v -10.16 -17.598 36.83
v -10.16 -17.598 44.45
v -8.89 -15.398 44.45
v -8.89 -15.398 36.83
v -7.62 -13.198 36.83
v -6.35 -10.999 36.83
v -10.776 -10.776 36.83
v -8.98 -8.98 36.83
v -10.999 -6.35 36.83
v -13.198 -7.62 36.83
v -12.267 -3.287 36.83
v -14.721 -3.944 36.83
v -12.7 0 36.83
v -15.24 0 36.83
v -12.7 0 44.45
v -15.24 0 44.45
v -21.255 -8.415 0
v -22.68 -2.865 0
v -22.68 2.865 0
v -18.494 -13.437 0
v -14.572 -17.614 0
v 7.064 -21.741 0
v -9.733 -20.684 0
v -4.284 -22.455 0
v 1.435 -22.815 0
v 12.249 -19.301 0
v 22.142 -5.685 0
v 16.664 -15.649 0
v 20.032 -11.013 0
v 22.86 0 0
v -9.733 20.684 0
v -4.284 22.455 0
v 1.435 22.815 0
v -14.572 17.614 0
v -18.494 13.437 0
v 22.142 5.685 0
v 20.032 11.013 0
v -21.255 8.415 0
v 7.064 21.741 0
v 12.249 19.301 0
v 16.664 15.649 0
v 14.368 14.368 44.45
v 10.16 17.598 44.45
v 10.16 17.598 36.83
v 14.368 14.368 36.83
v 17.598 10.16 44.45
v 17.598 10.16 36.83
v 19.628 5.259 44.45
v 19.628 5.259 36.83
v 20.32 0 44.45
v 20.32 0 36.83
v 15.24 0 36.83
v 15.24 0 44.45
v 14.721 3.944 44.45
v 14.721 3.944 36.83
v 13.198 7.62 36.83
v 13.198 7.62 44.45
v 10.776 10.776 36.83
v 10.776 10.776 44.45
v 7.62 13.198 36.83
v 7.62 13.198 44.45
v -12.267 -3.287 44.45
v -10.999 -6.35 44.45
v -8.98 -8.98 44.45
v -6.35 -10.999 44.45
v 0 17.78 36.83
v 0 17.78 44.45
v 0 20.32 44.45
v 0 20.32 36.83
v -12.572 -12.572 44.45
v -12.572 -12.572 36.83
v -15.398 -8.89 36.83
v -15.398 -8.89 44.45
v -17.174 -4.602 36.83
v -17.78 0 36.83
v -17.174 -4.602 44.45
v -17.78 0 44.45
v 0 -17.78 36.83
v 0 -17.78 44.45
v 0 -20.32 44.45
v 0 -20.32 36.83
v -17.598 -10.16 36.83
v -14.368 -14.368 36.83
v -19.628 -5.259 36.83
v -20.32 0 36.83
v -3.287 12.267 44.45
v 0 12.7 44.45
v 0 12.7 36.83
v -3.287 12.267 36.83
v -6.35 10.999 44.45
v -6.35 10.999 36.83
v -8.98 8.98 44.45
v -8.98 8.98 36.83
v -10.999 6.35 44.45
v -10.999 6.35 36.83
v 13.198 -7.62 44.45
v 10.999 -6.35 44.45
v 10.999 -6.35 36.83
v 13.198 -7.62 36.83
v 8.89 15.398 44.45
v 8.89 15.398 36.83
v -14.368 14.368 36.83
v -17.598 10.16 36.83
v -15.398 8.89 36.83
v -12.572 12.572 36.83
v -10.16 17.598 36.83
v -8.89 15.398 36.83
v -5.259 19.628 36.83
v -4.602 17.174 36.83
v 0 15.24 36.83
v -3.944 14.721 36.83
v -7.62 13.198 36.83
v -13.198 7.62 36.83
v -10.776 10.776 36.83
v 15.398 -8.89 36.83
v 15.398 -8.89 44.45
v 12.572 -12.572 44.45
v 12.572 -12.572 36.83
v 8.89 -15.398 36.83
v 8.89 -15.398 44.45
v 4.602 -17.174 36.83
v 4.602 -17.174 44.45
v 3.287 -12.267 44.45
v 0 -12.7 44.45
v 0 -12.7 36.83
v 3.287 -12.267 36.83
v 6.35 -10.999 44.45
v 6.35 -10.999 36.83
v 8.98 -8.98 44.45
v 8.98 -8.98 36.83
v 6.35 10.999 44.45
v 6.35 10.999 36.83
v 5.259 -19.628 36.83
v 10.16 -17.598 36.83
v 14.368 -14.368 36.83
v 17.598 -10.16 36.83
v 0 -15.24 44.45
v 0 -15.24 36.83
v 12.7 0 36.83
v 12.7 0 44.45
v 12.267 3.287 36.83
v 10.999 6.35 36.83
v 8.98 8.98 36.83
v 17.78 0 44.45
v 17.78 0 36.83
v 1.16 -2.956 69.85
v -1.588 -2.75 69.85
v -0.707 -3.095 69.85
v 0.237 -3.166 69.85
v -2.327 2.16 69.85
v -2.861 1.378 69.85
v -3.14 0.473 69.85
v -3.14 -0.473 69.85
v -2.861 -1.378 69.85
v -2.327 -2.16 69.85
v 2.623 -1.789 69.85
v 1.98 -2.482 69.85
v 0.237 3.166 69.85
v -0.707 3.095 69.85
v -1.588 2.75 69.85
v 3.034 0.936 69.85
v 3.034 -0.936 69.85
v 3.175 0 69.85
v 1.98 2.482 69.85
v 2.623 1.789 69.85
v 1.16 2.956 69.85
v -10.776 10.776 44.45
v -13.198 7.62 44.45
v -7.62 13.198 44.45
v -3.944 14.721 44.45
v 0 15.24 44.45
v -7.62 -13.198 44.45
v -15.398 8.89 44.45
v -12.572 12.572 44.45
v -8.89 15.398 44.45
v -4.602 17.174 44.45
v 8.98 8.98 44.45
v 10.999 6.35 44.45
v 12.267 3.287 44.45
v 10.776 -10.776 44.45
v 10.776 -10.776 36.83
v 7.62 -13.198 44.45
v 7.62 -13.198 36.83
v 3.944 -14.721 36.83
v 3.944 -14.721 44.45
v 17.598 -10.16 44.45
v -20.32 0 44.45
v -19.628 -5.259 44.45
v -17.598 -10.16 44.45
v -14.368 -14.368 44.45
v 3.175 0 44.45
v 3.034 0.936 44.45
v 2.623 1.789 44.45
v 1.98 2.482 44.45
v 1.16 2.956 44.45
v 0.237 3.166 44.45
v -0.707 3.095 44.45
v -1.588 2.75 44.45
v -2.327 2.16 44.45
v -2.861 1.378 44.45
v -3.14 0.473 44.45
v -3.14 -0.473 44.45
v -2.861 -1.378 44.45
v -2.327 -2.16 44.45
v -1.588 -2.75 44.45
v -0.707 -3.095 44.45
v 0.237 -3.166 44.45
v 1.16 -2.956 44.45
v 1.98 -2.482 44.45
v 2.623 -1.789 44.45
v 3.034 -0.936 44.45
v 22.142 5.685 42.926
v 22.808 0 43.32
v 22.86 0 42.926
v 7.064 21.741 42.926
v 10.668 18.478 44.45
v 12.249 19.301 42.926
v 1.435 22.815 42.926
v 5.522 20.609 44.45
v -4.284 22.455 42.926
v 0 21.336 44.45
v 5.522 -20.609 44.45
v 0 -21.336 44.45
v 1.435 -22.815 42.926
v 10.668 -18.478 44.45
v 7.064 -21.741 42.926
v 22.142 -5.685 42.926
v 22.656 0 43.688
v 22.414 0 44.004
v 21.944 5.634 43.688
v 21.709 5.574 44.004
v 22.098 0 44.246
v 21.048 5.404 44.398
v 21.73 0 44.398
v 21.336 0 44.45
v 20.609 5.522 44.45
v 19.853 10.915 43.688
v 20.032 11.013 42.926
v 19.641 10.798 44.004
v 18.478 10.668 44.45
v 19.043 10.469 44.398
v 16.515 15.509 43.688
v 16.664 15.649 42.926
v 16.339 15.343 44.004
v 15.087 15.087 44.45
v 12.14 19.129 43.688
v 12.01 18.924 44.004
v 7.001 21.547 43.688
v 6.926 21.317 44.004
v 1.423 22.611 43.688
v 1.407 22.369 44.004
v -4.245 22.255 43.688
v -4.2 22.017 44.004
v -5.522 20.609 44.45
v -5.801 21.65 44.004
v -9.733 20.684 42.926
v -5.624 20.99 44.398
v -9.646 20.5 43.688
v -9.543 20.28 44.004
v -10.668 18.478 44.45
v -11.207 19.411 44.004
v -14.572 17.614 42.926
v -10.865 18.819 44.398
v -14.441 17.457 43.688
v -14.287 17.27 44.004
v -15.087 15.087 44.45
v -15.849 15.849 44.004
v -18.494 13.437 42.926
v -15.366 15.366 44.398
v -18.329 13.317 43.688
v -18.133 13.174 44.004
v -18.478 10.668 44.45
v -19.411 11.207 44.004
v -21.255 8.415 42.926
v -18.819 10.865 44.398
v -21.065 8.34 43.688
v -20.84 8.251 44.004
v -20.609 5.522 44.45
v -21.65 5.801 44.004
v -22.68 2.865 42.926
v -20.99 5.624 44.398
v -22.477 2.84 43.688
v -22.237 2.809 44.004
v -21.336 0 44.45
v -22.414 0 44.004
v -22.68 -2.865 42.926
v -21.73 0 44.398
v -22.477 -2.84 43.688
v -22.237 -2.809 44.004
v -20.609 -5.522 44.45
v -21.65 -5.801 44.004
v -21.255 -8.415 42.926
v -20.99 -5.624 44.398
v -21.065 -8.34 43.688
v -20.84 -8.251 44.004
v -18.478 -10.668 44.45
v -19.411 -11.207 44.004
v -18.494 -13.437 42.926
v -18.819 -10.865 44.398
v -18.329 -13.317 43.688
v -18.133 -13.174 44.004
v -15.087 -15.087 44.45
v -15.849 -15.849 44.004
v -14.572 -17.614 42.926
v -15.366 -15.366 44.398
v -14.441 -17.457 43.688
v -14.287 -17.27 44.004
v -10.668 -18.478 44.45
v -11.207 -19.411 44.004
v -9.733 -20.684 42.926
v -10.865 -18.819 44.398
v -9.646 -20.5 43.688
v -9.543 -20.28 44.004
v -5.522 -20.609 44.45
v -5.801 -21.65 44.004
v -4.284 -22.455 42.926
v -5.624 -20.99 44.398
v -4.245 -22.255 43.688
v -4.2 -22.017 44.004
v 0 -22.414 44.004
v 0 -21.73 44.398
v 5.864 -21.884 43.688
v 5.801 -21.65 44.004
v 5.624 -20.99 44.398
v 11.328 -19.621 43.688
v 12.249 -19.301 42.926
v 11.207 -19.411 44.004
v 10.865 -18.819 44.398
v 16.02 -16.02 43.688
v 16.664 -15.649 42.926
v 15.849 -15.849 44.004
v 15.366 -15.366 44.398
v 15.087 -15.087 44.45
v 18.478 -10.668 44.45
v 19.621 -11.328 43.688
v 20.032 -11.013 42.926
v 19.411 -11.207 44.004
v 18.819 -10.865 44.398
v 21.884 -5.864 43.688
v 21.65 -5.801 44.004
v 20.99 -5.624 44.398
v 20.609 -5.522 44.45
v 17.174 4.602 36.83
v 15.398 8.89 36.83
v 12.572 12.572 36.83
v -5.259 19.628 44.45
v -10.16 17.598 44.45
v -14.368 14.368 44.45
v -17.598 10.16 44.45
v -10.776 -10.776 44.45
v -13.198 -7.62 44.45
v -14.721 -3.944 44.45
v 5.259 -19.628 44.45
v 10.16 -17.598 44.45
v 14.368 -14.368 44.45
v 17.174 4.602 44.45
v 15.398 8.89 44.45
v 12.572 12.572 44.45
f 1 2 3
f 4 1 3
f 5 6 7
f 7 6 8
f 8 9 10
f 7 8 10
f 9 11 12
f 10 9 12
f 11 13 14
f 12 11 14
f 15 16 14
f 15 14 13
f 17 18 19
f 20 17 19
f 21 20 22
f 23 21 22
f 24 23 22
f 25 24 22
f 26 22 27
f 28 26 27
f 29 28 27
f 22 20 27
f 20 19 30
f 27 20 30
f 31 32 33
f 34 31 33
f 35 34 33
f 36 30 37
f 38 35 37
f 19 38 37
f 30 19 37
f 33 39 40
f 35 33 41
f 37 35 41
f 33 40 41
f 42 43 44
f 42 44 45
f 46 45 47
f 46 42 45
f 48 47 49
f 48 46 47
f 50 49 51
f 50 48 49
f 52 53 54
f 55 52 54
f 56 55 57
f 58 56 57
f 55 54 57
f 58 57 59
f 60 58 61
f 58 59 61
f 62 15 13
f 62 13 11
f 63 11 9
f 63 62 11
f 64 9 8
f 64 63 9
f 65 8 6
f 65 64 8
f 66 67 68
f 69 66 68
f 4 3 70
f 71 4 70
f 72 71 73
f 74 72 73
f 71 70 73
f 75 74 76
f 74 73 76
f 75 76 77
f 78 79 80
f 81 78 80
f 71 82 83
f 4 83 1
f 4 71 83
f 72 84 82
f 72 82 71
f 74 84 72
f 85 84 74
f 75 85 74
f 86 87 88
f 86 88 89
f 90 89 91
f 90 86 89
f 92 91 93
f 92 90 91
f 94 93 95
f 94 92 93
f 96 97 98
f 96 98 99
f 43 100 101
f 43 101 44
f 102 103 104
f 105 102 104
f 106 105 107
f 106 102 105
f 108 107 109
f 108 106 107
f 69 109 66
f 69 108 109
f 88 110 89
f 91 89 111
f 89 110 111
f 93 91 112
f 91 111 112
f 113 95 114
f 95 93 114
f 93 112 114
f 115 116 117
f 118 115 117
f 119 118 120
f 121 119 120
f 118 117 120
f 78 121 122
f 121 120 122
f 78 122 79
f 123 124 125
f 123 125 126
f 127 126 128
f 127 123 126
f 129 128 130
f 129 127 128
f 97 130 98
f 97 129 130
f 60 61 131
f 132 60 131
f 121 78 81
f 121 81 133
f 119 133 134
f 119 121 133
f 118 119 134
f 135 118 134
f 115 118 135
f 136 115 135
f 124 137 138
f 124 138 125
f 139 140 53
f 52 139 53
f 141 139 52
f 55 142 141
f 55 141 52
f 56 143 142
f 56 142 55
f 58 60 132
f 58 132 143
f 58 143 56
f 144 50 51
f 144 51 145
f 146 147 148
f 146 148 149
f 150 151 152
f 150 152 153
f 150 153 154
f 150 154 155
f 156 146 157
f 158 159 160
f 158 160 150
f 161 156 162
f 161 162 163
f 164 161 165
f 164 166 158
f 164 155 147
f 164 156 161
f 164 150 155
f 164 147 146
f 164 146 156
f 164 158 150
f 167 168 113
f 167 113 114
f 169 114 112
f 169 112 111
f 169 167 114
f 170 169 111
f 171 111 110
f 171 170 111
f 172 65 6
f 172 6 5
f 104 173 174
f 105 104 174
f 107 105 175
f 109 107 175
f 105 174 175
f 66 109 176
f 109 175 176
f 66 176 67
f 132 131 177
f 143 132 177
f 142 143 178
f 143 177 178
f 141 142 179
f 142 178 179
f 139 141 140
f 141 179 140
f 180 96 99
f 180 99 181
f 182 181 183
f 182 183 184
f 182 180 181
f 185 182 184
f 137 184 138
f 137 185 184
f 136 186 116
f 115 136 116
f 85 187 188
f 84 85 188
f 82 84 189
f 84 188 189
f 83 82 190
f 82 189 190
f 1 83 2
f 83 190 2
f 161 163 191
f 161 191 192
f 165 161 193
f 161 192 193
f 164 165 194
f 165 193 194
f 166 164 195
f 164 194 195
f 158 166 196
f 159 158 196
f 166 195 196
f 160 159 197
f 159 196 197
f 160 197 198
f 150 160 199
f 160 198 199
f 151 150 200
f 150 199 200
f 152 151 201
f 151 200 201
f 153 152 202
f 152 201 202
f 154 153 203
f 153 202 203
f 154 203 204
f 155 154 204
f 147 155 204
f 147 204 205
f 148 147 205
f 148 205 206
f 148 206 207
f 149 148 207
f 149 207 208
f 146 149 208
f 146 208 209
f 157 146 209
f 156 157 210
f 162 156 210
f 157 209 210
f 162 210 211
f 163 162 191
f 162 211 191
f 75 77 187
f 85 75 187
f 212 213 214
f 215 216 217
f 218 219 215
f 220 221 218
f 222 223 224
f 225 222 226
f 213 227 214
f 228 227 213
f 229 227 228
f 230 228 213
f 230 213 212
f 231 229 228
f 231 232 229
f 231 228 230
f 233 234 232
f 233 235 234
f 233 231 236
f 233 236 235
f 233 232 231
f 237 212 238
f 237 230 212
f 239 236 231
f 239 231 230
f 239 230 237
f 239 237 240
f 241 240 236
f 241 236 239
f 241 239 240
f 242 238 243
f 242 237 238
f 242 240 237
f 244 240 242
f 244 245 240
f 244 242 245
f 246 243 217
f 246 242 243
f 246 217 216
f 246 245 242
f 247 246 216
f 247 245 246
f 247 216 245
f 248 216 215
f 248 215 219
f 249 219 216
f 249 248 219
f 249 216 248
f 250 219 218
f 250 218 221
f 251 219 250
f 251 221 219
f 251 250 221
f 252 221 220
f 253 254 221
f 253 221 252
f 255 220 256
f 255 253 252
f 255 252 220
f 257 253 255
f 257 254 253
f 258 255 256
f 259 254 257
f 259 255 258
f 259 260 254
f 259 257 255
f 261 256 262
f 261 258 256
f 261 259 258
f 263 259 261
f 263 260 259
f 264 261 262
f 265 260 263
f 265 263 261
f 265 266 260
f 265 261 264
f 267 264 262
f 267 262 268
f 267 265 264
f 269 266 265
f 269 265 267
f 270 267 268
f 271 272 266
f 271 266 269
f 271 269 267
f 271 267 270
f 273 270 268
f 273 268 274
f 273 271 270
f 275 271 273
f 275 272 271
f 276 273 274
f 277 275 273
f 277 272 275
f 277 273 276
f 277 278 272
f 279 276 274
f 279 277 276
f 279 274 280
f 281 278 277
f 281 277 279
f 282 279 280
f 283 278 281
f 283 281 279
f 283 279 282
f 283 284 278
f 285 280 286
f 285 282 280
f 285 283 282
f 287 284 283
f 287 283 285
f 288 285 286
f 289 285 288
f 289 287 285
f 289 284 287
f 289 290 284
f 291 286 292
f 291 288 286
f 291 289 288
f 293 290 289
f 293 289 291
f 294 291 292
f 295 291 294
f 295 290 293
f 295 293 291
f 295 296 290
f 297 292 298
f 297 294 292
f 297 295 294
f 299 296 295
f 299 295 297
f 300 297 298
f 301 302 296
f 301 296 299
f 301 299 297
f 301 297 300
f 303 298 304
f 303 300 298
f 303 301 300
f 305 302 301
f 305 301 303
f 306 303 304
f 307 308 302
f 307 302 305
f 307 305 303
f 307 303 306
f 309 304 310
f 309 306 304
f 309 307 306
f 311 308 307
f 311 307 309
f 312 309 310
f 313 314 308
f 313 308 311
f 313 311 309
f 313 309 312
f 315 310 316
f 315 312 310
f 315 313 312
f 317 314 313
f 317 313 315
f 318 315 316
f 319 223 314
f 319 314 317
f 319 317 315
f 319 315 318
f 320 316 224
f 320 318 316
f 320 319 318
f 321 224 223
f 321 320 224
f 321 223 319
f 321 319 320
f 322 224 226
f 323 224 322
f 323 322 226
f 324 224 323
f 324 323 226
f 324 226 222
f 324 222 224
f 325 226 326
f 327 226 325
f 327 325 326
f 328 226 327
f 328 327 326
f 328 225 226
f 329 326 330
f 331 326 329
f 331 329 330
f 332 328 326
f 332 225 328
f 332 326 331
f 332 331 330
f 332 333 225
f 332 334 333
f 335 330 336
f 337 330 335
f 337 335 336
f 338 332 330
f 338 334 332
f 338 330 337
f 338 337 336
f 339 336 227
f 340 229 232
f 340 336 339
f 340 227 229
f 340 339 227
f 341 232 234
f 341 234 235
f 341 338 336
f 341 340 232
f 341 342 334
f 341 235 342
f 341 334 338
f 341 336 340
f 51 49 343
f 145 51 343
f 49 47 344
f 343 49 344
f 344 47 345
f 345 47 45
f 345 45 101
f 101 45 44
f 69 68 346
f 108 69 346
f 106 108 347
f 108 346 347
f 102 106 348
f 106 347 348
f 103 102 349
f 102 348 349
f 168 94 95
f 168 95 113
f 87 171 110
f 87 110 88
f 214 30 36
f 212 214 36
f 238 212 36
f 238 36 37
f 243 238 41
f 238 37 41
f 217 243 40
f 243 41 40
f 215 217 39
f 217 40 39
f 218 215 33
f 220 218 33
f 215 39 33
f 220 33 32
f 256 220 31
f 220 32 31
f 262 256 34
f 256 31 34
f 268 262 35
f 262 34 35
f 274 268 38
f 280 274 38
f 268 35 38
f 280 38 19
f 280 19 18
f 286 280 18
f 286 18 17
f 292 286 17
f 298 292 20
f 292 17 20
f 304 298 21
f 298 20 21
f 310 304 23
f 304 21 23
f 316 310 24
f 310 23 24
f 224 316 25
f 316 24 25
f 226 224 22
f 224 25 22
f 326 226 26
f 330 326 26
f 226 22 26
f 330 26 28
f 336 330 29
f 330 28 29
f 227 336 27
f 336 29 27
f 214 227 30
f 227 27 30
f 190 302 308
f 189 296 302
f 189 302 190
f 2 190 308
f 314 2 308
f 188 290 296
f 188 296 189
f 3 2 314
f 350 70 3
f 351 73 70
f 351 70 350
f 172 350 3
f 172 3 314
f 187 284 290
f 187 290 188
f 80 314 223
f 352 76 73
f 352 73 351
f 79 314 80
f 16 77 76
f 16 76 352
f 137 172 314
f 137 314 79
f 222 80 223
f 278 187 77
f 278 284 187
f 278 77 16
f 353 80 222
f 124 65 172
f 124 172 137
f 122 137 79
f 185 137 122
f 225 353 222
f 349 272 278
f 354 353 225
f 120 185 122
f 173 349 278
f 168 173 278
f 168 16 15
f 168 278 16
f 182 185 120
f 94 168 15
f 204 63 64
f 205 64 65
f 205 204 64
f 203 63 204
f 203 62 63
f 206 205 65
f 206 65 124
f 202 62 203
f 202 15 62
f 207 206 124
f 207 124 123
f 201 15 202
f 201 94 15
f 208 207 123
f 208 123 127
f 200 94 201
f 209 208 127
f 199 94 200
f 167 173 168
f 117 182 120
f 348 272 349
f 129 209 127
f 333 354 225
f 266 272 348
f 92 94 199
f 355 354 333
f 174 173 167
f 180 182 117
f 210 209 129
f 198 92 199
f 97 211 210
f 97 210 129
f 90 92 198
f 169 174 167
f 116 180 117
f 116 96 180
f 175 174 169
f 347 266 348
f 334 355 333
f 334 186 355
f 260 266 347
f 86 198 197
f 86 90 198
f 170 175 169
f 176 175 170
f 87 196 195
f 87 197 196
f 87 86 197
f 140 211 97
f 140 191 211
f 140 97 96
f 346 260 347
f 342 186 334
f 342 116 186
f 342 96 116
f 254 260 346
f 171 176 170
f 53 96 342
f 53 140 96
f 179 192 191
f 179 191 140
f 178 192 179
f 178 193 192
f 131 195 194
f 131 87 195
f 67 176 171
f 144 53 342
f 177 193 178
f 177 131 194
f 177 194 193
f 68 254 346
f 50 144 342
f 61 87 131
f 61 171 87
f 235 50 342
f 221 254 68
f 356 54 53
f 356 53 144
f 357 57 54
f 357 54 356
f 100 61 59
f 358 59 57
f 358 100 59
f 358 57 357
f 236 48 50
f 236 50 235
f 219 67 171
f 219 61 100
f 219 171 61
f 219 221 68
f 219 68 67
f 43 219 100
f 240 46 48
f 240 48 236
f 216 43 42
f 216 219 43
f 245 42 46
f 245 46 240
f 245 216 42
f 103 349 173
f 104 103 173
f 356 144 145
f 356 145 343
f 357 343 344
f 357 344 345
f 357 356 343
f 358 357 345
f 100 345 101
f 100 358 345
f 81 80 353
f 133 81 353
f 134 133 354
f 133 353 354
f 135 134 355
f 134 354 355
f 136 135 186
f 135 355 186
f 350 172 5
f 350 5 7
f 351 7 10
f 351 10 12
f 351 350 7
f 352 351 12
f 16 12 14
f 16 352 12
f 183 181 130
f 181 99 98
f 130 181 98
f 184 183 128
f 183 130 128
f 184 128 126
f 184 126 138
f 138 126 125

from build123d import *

# Parameters (mm, degrees)
IZIM1_R                     = 22.86
Y_KSEKLIK_EKSTR_ZYON1_DEPTH = 44.45
IZIM2_R                     = 3.175
Y_KSEKLIK_EKSTR_ZYON2_DEPTH = 25.4
KES_EKSTR_ZYON1_DEPTH       = 7.62
RADYUS1_R                   = 1.524


with BuildPart() as part:
    # Çizim1 → Yükseklik-Ekstrüzyon1 (new body)
    with BuildSketch(Plane.XY):
        Circle(IZIM1_R)
    extrude(amount=Y_KSEKLIK_EKSTR_ZYON1_DEPTH)

    # Çizim2 → Yükseklik-Ekstrüzyon2 (add)
    with BuildSketch(Plane.XY.offset(44.45)):
        Circle(IZIM2_R)
    extrude(amount=Y_KSEKLIK_EKSTR_ZYON2_DEPTH)

    # Çizim3 → Kes-Ekstrüzyon1 (cut)
    with BuildSketch(Plane.XY.offset(44.45)):
        with BuildLine():
            Line((12.7, 0), (15.24, 0))
            ThreePointArc((15.24, 0), (13.198227154, 7.62), (7.62, 13.198227154))
            Line((7.62, 13.198227154), (6.35, 10.998522628))
            ThreePointArc((6.35, 10.998522628), (10.998522628, 6.35), (12.7, 0))
        make_face()
        with BuildLine():
            Line((8.89, 15.397931679), (10.16, 17.597636205))
            ThreePointArc((10.16, 17.597636205), (17.597636205, 10.16), (20.32, 0))
            Line((20.32, 0), (17.78, 0))
            ThreePointArc((17.78, 0), (15.397931679, 8.89), (8.89, 15.397931679))
        make_face()
        with BuildLine():
            Line((10.998522628, -6.35), (13.198227154, -7.62))
            ThreePointArc((13.198227154, -7.62), (7.62, -13.198227154), (0, -15.24))
            Line((0, -15.24), (0, -12.7))
            ThreePointArc((0, -12.7), (6.35, -10.998522628), (10.998522628, -6.35))
        make_face()
        with BuildLine():
            Line((0, -17.78), (0, -20.32))
            ThreePointArc((0, -20.32), (10.16, -17.597636205), (17.597636205, -10.16))
            Line((17.597636205, -10.16), (15.397931679, -8.89))
            ThreePointArc((15.397931679, -8.89), (8.89, -15.397931679), (0, -17.78))
        make_face()
        with BuildLine():
            Line((-6.35, -10.998522628), (-7.62, -13.198227154))
            ThreePointArc((-7.62, -13.198227154), (-13.198227154, -7.62), (-15.24, 0))
            Line((-15.24, 0), (-12.7, 0))
            ThreePointArc((-12.7, 0), (-10.998522628, -6.35), (-6.35, -10.998522628))
        make_face()
        with BuildLine():
            Line((-17.78, 0), (-20.32, 0))
            ThreePointArc((-20.32, 0), (-17.597636205, -10.16), (-10.16, -17.597636205))
            Line((-10.16, -17.597636205), (-8.89, -15.397931679))
            ThreePointArc((-8.89, -15.397931679), (-15.397931679, -8.89), (-17.78, 0))
        make_face()
        with BuildLine():
            Line((-10.998522628, 6.35), (-13.198227154, 7.62))
            ThreePointArc((-13.198227154, 7.62), (-7.62, 13.198227154), (0, 15.24))
            Line((0, 15.24), (0, 12.7))
            ThreePointArc((0, 12.7), (-6.35, 10.998522628), (-10.998522628, 6.35))
        make_face()
        with BuildLine():
            Line((0, 17.78), (0, 20.32))
            ThreePointArc((0, 20.32), (-10.16, 17.597636205), (-17.597636205, 10.16))
            Line((-17.597636205, 10.16), (-15.397931679, 8.89))
            ThreePointArc((-15.397931679, 8.89), (-8.89, 15.397931679), (0, 17.78))
        make_face()
    extrude(amount=-KES_EKSTR_ZYON1_DEPTH, mode=Mode.SUBTRACT)

    # Radyus1
    radyus1_edges = [part.edges().sort_by_distance(p)[0] for p in [
        (-22.86, 0, 44.45),
    ]]
    fillet(radyus1_edges, radius=RADYUS1_R)


solid = part.part
